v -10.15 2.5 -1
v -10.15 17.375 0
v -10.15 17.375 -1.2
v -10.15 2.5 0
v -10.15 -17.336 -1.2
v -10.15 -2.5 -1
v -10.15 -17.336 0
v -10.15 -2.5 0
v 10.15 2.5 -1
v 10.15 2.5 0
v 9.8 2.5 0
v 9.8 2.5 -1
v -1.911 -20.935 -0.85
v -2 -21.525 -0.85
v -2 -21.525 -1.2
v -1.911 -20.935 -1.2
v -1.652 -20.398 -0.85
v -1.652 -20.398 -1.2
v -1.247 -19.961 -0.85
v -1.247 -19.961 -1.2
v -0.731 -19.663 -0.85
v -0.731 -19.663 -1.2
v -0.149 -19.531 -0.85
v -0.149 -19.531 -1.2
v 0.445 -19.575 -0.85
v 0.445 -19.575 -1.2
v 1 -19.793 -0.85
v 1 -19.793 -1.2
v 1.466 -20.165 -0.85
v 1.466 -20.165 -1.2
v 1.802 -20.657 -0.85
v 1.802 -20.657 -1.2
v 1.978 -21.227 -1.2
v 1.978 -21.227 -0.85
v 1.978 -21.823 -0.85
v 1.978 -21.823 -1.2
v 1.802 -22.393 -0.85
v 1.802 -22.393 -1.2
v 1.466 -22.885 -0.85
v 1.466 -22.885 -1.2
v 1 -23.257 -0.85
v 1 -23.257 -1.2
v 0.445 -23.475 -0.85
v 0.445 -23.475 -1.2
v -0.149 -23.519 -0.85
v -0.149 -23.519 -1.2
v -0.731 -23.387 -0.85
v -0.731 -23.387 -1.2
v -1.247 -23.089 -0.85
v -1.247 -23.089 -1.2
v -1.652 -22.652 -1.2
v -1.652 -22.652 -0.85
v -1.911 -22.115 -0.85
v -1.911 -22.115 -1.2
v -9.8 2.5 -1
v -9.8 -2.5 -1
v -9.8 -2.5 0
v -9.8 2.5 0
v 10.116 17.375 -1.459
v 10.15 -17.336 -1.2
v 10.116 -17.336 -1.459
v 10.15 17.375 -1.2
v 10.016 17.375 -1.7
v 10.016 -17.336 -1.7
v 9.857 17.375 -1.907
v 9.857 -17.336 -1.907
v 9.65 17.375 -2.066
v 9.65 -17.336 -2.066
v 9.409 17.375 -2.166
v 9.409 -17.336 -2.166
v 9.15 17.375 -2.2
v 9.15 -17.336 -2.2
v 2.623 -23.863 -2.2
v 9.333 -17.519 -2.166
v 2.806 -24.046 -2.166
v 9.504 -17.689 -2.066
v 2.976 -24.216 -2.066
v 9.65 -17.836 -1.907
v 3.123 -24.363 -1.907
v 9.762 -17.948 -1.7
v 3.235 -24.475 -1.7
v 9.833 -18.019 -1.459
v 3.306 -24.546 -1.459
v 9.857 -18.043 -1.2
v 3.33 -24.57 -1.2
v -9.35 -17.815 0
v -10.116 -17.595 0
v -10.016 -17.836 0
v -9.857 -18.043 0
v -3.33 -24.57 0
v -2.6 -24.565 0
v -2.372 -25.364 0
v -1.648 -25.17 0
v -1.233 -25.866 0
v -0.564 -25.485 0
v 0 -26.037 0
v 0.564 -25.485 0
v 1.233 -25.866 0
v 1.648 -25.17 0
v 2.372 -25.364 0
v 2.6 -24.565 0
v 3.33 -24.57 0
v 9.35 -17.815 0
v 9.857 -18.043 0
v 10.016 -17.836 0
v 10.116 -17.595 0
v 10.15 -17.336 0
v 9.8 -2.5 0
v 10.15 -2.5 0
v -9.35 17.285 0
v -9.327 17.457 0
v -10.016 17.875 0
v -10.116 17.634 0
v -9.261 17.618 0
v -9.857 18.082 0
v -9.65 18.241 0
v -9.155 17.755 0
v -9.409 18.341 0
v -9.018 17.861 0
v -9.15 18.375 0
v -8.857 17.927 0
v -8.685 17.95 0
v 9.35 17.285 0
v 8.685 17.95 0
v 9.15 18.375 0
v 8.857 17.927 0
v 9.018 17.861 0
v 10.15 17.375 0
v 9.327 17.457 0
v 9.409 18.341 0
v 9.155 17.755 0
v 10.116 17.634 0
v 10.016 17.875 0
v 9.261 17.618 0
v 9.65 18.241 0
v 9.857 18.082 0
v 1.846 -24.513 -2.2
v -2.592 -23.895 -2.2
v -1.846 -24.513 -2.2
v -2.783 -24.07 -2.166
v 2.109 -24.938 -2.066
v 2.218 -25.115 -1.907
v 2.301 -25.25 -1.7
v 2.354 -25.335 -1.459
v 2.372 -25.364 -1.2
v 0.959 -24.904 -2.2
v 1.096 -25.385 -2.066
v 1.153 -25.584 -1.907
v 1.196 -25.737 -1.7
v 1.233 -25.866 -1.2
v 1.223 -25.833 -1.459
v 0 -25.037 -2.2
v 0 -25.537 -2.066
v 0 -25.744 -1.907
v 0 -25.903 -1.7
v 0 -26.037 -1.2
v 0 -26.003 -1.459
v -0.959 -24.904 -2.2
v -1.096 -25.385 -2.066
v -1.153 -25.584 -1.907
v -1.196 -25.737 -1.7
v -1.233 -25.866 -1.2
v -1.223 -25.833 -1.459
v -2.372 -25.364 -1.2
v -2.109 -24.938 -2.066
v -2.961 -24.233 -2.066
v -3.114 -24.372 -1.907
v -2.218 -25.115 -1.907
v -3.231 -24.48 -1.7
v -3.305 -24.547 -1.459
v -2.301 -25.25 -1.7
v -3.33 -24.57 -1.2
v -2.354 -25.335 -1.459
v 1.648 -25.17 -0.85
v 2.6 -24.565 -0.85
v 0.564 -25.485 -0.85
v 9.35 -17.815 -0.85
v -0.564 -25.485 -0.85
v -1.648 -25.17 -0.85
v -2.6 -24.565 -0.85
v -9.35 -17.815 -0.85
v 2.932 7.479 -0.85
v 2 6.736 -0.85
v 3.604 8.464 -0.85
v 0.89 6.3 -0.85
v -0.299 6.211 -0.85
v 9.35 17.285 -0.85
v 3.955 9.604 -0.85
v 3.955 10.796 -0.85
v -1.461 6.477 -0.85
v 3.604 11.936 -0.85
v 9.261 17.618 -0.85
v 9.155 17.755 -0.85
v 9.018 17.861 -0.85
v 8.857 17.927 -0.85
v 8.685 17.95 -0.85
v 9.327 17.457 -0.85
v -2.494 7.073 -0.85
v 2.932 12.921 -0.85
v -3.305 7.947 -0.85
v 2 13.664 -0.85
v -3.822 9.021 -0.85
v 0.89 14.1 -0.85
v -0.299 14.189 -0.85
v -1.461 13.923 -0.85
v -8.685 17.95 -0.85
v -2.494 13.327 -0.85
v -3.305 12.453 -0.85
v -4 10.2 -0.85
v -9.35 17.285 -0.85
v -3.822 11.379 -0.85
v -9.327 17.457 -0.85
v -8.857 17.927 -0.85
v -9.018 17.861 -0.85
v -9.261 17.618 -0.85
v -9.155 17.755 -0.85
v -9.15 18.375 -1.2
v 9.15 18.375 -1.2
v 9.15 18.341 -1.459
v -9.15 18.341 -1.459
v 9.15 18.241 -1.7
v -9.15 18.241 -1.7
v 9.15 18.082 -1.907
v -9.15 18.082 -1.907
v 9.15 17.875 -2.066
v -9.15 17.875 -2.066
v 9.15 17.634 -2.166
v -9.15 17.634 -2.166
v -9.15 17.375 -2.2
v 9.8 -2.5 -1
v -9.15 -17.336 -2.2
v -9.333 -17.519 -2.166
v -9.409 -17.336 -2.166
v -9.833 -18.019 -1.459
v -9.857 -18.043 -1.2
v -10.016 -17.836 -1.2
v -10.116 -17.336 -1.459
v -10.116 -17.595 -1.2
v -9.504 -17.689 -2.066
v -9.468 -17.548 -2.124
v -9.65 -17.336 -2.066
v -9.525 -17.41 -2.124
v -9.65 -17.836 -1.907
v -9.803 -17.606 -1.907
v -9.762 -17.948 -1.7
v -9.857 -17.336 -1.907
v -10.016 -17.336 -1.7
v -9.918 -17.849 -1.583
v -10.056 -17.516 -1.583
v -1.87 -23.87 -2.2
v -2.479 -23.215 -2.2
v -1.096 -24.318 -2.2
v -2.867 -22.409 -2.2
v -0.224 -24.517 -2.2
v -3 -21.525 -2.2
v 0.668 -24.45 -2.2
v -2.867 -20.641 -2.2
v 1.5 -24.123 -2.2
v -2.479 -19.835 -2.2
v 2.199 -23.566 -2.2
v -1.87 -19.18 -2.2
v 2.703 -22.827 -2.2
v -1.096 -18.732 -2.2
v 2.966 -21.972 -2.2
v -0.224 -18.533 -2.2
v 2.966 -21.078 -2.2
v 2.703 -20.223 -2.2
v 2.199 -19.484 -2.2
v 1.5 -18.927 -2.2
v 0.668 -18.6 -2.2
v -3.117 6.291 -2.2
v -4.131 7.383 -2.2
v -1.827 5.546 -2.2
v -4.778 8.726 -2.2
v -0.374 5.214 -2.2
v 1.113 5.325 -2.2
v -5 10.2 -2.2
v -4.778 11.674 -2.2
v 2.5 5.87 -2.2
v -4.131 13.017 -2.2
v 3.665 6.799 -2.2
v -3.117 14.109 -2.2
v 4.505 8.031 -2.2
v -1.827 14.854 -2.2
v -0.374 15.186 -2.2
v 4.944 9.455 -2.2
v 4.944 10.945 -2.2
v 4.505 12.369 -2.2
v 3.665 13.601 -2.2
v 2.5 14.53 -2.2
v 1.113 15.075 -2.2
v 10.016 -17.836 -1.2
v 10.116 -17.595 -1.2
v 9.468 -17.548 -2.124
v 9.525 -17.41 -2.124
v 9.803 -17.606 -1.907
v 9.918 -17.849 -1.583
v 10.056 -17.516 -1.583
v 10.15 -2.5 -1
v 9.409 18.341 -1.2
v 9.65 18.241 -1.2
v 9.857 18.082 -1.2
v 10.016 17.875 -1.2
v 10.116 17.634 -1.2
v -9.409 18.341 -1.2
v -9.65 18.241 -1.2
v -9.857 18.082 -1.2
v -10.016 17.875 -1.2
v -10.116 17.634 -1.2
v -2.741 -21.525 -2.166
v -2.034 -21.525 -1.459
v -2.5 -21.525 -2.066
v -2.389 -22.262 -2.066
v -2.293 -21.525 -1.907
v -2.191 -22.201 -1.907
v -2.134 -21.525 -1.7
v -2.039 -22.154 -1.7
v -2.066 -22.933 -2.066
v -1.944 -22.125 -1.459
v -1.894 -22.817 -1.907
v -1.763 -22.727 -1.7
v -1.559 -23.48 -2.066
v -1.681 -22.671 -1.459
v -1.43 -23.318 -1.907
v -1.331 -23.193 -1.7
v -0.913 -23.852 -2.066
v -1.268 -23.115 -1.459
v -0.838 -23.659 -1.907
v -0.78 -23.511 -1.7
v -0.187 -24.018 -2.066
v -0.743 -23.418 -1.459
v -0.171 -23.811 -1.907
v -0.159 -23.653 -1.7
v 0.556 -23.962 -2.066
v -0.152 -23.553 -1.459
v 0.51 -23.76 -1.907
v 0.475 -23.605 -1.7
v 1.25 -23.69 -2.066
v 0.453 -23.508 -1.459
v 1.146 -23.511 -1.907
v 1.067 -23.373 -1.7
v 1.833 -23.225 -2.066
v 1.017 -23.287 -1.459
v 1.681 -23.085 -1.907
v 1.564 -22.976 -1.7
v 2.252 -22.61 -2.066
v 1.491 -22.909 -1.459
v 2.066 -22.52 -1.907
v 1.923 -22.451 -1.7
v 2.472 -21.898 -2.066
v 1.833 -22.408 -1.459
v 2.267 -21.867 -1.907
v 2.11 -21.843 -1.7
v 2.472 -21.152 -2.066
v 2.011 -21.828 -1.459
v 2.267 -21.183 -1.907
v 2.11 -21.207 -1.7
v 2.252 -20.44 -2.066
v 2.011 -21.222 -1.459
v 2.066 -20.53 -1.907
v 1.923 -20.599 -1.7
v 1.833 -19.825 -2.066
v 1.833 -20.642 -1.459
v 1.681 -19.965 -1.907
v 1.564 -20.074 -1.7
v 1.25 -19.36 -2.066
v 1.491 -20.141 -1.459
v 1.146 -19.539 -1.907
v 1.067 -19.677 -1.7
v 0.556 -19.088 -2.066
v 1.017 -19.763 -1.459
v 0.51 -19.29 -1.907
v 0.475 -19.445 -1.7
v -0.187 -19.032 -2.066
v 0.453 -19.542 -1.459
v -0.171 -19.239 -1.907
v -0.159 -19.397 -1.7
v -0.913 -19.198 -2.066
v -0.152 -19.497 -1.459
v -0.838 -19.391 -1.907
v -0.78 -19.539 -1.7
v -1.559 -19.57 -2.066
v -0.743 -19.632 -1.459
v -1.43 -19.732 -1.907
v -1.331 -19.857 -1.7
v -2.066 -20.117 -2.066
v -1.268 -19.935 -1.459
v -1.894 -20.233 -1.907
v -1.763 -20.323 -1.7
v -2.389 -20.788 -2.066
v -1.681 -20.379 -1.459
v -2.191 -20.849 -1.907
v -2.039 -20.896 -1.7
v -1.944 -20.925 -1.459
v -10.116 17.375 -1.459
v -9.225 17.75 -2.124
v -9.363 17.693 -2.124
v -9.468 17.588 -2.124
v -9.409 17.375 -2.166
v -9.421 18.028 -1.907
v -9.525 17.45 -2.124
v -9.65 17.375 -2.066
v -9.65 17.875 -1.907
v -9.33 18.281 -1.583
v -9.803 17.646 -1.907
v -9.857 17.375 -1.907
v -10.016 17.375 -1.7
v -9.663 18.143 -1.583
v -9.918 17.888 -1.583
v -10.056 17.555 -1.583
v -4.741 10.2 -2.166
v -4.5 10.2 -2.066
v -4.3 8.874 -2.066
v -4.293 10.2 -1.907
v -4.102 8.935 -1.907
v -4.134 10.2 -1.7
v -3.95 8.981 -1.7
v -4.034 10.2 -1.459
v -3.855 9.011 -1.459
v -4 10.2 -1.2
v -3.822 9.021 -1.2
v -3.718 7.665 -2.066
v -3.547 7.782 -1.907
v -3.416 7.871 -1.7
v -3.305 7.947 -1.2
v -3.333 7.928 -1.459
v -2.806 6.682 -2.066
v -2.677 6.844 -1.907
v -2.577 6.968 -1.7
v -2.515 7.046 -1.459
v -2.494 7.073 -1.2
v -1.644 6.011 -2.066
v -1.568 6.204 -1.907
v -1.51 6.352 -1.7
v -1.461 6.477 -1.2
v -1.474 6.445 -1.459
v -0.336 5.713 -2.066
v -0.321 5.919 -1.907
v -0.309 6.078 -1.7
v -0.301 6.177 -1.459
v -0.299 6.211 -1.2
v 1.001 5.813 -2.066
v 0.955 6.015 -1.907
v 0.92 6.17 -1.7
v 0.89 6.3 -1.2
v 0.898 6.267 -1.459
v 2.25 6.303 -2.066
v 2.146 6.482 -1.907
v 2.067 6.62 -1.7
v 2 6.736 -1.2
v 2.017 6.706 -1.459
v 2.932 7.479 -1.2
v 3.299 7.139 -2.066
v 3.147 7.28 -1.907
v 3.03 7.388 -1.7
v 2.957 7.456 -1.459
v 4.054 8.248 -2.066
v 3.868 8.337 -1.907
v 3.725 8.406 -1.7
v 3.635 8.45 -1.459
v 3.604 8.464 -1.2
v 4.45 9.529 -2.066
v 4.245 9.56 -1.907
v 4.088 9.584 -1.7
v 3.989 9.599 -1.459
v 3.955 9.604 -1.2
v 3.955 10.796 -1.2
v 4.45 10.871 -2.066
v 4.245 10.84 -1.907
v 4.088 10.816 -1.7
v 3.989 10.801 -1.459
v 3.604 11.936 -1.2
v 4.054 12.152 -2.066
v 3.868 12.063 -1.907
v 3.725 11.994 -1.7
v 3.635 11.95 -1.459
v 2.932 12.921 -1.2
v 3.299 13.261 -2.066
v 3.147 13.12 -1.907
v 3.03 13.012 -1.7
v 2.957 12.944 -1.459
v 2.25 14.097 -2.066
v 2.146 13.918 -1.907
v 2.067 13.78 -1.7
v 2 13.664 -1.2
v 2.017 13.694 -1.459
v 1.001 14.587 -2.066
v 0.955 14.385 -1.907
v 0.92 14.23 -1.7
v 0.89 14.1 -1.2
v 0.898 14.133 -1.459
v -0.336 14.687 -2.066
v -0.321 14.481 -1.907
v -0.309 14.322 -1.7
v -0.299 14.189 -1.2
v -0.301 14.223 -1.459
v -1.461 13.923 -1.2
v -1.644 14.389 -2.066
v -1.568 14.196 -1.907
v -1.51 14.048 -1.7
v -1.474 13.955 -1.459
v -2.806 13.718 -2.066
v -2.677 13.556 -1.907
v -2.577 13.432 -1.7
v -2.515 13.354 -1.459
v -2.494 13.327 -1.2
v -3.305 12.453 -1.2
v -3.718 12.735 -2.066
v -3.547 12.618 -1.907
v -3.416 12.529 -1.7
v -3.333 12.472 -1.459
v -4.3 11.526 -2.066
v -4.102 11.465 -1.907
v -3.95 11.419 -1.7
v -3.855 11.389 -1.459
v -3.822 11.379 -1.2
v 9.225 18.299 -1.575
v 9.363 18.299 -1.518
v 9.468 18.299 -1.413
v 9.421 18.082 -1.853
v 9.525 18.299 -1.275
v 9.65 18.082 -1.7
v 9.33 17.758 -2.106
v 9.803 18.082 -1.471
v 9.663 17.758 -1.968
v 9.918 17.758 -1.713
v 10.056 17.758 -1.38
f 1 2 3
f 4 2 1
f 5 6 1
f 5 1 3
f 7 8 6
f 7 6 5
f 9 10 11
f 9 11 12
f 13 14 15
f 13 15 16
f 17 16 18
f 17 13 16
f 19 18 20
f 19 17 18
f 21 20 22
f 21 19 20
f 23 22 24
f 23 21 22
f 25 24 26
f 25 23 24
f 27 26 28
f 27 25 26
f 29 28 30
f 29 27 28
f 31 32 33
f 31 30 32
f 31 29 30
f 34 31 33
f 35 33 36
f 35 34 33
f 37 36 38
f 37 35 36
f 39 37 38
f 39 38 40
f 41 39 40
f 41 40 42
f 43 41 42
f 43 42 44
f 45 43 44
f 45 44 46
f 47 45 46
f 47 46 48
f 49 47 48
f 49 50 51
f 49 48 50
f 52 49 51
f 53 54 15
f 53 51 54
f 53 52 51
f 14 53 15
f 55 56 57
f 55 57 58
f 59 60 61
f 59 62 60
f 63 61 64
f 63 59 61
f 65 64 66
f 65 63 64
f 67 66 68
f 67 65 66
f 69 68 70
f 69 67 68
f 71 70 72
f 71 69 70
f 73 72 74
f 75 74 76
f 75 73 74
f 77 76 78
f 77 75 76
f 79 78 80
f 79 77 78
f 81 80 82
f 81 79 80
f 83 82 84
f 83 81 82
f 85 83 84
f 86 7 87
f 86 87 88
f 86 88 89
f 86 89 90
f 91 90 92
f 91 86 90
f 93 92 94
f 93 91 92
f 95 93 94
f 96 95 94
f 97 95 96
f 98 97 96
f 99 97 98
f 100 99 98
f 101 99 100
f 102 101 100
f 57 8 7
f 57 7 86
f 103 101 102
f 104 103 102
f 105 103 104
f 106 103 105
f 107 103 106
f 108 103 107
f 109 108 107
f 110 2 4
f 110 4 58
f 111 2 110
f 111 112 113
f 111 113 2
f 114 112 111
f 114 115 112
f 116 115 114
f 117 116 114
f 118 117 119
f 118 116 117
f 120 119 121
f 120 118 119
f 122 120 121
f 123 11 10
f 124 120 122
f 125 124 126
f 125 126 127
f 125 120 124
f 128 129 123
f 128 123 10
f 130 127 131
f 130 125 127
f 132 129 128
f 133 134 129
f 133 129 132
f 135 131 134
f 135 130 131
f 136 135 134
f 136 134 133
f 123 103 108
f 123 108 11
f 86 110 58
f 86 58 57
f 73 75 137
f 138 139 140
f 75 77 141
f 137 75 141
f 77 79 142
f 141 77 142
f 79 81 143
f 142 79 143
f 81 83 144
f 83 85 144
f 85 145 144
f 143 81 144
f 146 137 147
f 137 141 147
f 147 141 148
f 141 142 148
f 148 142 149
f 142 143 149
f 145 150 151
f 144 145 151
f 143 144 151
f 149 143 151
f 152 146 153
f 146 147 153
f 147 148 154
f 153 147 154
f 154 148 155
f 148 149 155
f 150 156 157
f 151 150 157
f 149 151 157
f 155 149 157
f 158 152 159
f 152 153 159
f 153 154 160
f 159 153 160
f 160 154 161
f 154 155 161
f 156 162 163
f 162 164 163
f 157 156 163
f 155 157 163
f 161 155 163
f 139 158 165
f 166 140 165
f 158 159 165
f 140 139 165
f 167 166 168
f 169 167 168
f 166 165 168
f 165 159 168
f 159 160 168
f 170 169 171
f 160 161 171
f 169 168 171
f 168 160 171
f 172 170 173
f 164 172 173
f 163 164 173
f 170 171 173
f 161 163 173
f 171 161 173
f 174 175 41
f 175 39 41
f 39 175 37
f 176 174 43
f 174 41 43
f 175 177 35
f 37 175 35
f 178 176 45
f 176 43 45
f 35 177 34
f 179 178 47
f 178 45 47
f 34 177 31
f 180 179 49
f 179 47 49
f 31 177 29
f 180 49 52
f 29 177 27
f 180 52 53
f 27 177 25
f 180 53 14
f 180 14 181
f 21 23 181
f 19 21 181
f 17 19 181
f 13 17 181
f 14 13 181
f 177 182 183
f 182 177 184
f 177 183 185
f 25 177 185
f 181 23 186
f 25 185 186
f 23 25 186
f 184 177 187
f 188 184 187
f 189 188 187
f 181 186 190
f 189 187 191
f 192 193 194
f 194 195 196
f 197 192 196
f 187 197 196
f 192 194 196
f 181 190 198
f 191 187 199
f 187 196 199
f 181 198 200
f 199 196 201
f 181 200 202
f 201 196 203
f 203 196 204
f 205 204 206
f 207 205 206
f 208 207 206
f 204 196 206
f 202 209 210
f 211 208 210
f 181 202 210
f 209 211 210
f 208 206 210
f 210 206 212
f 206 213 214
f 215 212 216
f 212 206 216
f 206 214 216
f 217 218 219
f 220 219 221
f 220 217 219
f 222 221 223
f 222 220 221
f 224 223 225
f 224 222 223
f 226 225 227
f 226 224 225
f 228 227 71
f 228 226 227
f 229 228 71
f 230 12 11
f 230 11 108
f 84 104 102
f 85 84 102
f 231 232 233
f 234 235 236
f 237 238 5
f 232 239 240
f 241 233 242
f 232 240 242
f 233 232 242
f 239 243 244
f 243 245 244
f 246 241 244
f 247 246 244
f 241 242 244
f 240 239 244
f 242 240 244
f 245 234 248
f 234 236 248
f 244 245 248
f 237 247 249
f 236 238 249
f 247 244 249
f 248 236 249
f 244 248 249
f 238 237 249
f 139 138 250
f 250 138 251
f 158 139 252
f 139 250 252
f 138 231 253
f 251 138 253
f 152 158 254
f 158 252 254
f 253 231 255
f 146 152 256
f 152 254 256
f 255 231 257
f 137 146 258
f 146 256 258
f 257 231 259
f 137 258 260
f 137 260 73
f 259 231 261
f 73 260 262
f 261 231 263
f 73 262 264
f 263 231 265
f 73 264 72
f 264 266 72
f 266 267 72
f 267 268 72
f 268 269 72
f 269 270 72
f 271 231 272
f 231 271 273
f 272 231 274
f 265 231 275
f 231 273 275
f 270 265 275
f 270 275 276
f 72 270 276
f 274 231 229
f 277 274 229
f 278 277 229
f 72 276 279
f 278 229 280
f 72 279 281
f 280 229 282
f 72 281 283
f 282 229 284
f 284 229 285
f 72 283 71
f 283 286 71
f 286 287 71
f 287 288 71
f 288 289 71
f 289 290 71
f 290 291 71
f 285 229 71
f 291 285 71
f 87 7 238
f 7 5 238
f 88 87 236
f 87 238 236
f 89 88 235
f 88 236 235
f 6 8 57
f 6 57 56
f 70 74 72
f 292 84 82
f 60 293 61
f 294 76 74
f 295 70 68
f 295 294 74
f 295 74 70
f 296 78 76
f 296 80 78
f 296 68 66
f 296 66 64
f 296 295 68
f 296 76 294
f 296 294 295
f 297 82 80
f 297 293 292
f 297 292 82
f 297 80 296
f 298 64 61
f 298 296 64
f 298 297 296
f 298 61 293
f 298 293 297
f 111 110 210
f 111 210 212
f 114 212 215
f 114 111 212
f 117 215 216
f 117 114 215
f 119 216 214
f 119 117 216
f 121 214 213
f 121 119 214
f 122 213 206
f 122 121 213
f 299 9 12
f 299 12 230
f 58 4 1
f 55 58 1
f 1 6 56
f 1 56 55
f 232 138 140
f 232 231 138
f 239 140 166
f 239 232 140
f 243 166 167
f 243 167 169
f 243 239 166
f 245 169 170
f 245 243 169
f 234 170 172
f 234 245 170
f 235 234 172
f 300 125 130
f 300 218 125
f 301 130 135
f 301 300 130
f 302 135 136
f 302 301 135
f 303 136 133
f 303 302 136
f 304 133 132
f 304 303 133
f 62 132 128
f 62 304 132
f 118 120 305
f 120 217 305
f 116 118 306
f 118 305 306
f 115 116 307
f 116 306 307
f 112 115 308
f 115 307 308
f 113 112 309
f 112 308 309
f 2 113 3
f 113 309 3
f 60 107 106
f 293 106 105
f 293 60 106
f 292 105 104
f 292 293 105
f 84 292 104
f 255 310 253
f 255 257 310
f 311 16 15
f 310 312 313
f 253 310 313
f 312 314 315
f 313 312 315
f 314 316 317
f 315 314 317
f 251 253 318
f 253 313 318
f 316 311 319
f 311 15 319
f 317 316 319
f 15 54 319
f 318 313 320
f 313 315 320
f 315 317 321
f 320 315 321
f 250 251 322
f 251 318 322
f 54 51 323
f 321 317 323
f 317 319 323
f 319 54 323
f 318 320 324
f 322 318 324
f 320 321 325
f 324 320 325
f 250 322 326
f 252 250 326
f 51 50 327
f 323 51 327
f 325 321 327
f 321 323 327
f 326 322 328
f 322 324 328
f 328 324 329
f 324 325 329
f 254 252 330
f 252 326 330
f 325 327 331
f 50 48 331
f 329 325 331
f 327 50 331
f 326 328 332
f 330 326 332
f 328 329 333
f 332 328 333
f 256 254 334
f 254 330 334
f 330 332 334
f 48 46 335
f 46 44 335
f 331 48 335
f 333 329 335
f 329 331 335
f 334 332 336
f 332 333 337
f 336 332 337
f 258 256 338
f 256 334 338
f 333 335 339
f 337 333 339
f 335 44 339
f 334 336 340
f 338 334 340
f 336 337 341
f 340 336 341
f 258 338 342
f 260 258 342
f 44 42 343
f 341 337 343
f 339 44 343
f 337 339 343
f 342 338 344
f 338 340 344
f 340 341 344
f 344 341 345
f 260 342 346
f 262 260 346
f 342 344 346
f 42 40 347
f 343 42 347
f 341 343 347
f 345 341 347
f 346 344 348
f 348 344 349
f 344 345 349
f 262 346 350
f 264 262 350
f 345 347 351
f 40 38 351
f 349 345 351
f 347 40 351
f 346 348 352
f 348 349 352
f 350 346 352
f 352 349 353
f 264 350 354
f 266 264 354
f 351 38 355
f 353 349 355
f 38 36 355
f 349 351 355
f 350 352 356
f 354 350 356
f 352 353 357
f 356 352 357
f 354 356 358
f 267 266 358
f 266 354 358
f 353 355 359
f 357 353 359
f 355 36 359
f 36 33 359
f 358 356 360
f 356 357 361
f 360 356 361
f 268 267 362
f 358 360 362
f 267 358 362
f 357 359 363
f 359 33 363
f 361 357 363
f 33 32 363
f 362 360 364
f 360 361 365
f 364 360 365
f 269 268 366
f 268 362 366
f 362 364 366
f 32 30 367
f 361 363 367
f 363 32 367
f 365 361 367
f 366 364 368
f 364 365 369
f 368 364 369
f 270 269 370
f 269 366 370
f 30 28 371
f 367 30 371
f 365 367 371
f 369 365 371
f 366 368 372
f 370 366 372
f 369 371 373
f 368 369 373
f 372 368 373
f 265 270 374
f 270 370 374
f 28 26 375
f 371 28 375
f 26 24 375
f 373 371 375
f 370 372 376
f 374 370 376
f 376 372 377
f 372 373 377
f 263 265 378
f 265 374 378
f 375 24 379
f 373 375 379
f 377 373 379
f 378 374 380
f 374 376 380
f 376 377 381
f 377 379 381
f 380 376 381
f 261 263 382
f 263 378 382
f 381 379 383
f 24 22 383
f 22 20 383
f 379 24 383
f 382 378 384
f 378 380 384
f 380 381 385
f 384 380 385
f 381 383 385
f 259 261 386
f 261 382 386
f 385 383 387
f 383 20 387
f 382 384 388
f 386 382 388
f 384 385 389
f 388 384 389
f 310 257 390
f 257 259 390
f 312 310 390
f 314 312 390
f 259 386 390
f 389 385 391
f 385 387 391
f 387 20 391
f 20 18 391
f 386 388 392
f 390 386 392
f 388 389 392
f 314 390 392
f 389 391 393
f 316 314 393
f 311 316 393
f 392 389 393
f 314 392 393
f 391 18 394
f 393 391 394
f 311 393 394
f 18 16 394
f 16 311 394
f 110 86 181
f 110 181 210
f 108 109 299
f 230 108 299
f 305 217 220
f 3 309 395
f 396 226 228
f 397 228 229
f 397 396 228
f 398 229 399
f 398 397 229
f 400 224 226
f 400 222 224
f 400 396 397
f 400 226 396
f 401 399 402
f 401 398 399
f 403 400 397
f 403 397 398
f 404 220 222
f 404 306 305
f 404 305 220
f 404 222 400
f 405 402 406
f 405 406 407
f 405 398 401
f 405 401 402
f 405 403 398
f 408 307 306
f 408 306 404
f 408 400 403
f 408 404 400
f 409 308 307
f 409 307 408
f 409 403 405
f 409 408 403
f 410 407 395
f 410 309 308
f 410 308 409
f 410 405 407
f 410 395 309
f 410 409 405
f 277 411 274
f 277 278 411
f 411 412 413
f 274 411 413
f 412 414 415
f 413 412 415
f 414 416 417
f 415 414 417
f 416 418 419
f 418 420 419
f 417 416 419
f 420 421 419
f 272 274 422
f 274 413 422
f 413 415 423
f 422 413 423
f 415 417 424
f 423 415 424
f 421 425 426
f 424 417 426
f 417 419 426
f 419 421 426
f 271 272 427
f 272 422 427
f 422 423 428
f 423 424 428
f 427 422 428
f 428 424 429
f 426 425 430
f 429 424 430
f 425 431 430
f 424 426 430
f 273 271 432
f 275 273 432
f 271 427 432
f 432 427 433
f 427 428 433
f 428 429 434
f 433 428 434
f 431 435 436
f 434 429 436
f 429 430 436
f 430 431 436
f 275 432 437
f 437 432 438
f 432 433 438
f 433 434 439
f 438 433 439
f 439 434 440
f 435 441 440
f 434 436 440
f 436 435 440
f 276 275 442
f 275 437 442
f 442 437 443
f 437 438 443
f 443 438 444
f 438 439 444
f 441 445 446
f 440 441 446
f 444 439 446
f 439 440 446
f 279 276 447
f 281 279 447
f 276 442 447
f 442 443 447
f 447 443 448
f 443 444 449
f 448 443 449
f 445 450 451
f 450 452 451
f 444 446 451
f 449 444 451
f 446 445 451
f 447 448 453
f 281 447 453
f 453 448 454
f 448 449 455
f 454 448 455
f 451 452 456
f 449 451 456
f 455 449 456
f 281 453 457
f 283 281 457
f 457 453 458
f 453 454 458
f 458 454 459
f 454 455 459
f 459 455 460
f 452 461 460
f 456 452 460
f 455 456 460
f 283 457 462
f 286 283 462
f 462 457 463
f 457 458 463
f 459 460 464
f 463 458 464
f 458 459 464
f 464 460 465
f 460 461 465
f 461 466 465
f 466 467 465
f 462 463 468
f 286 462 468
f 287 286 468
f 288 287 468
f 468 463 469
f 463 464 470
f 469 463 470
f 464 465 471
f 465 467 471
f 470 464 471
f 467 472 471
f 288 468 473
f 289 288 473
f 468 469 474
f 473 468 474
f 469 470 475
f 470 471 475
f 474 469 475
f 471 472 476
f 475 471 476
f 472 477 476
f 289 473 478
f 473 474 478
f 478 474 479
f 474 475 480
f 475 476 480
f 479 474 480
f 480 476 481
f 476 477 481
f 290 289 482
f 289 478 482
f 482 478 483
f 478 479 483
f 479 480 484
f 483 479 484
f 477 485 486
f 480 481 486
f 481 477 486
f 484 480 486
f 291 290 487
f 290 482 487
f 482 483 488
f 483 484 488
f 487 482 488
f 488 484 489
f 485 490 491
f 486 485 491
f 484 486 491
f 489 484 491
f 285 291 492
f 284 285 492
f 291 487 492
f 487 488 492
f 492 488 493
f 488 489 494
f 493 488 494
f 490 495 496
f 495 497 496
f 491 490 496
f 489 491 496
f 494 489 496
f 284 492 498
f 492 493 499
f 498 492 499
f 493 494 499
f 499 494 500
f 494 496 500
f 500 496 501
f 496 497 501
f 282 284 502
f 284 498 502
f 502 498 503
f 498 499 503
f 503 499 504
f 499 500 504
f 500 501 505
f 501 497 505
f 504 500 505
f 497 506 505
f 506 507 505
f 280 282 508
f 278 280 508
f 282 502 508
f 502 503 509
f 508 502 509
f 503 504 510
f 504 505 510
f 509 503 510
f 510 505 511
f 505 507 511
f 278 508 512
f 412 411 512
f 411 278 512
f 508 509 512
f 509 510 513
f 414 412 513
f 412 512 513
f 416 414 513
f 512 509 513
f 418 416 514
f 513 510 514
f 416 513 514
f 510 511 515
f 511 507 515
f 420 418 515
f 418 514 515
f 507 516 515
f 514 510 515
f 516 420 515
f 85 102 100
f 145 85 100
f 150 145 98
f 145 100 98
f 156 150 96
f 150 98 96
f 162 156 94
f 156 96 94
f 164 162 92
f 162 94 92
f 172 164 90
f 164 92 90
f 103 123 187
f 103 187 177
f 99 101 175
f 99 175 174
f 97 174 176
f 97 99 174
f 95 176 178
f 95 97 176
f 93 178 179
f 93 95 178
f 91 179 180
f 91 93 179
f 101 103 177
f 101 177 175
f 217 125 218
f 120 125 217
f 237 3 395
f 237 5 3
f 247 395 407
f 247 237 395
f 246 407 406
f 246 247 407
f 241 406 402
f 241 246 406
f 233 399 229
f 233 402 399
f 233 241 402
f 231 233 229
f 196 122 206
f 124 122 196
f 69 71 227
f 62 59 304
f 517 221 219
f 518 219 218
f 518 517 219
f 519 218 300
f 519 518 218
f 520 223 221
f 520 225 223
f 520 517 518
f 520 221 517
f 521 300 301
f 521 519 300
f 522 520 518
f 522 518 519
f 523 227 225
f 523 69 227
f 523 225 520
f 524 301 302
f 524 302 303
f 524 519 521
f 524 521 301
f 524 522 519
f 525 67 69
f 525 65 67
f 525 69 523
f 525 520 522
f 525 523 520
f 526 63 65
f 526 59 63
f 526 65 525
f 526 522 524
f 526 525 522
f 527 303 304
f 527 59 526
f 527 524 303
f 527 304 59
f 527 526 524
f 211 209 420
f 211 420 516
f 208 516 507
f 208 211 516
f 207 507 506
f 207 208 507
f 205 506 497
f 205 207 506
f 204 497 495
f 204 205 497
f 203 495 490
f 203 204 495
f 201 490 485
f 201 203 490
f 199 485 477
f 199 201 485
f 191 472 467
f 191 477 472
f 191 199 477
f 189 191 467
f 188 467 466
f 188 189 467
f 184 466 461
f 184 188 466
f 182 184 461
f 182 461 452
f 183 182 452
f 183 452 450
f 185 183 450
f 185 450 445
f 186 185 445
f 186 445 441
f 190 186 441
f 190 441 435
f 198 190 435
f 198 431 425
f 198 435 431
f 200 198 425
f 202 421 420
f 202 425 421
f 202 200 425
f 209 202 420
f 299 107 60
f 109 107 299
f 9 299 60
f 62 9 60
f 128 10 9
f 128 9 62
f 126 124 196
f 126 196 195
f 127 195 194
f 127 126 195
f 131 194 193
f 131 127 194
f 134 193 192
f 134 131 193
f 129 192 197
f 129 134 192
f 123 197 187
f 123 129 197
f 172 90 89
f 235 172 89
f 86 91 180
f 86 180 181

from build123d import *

# Parameters (mm, degrees)
PAD011_DEPTH            = 2.2
SKETCH039_R             = 4
POCKET022_DEPTH         = 5
SKETCH040_R             = 2
POCKET027_DEPTH         = 5
POCKET023_DEPTH         = 0.85
SKETCH042_W             = 0.35
SKETCH042_H             = 0.6
POCKET024_DEPTH         = 25
FILLET004_R             = 1
SKETCH043_W             = 5
SKETCH043_H             = 1
POCKET029_DEPTH         = 0.35
SKETCH044_W             = 5
SKETCH044_H             = 1
POCKET028_DEPTH         = 0.35
BODY002_PLACEMENT_ANGLE = 180


with BuildPart() as part:
    # Sketch036 → Pad011 (new body)
    with BuildSketch(Plane.XY):
        with BuildLine():
            Line((-10.15, 18.375), (10.15, 18.375))
            Line((10.15, 18.375), (10.15, -17.75))
            Line((3.33, -24.57), (10.15, -17.75))
            ThreePointArc((-3.33, -24.57), (0, -26.037308), (3.33, -24.57))
            Line((-10.15, -17.75), (-3.33, -24.57))
            Line((-10.15, -17.75), (-10.15, 18.375))
        make_face()
    extrude(amount=PAD011_DEPTH)

    # Sketch039 → Pocket022 (cut)
    with BuildSketch(Plane.XY):
        with Locations((0, 10.2)):
            Circle(SKETCH039_R)
    extrude(amount=POCKET022_DEPTH, mode=Mode.SUBTRACT)

    # Sketch040 → Pocket027 (cut)
    with BuildSketch(Plane.XY):
        with Locations((0, -21.525)):
            Circle(SKETCH040_R)
    extrude(amount=POCKET027_DEPTH, mode=Mode.SUBTRACT)

    # Sketch041 → Pocket023 (cut)
    with BuildSketch(Plane.XY):
        with BuildLine():
            Line((-9.35, 17.285263), (-9.35, -17.814737))
            Line((-9.35, -17.814737), (-2.6, -24.564737))
            ThreePointArc((-2.6, -24.564737), (0, -25.525), (2.6, -24.564737))
            Line((2.6, -24.564737), (9.35, -17.814737))
            Line((9.35, -17.814737), (9.35, 17.285263))
            ThreePointArc((9.35, 17.285263), (9.155303, 17.755303), (8.685263, 17.95))
            Line((8.685263, 17.95), (-8.685263, 17.95))
            ThreePointArc((-8.685263, 17.95), (-9.155303, 17.755303), (-9.35, 17.285263))
        make_face()
    extrude(amount=POCKET023_DEPTH, mode=Mode.SUBTRACT)

    # Sketch042 (on Face16 of Pocket023) → Pocket024 (cut)
    with BuildSketch(Plane.YZ.offset(-9.35)):
        with Locations((-9.625, -1.8)):
            Rectangle(SKETCH042_W, SKETCH042_H)
        with Locations((9.625, -1.8)):
            Rectangle(SKETCH042_W, SKETCH042_H)
    extrude(amount=-POCKET024_DEPTH, mode=Mode.SUBTRACT)

    # Fillet004
    fillet004_edges = [part.edges().sort_by_distance(p)[0] for p in [
        (10.15, -17.75, 1.1),
        (10.15, 18.375, 1.1),
        (-6.74, -21.16, 2.2),
        (-10.15, 0.3125, 2.2),
        (0, -26.037308, 2.2),
        (0, 18.375, 2.2),
        (6.74, -21.16, 2.2),
        (10.15, 0.3125, 2.2),
        (-2, -21.525, 2.2),
        (-4, 10.2, 2.2),
        (-10.15, 18.375, 1.1),
        (-10.15, -17.75, 1.1),
    ]]
    fillet(fillet004_edges, radius=FILLET004_R)

    # Sketch043 (on Face10 of Fillet004) → Pocket029 (cut)
    with BuildSketch(Plane(origin=(-10.15, 0, 0), x_dir=(0, -1, 0), z_dir=(-1, 0, 0))):
        with Locations((0, 0.5)):
            Rectangle(SKETCH043_W, SKETCH043_H)
    extrude(amount=-POCKET029_DEPTH, mode=Mode.SUBTRACT)

    # Sketch044 (on Face11 of Pocket029) → Pocket028 (cut)
    with BuildSketch(Plane.YZ.offset(10.15)):
        with Locations((0, 0.5)):
            Rectangle(SKETCH044_W, SKETCH044_H)
    extrude(amount=-POCKET028_DEPTH, mode=Mode.SUBTRACT)


with BuildPart() as part_1:
    # Body002 placement: moved
    add(part.part.rotate(Axis((0, 0, 0), (0, 1, 0)), BODY002_PLACEMENT_ANGLE))


solid = part_1.part
